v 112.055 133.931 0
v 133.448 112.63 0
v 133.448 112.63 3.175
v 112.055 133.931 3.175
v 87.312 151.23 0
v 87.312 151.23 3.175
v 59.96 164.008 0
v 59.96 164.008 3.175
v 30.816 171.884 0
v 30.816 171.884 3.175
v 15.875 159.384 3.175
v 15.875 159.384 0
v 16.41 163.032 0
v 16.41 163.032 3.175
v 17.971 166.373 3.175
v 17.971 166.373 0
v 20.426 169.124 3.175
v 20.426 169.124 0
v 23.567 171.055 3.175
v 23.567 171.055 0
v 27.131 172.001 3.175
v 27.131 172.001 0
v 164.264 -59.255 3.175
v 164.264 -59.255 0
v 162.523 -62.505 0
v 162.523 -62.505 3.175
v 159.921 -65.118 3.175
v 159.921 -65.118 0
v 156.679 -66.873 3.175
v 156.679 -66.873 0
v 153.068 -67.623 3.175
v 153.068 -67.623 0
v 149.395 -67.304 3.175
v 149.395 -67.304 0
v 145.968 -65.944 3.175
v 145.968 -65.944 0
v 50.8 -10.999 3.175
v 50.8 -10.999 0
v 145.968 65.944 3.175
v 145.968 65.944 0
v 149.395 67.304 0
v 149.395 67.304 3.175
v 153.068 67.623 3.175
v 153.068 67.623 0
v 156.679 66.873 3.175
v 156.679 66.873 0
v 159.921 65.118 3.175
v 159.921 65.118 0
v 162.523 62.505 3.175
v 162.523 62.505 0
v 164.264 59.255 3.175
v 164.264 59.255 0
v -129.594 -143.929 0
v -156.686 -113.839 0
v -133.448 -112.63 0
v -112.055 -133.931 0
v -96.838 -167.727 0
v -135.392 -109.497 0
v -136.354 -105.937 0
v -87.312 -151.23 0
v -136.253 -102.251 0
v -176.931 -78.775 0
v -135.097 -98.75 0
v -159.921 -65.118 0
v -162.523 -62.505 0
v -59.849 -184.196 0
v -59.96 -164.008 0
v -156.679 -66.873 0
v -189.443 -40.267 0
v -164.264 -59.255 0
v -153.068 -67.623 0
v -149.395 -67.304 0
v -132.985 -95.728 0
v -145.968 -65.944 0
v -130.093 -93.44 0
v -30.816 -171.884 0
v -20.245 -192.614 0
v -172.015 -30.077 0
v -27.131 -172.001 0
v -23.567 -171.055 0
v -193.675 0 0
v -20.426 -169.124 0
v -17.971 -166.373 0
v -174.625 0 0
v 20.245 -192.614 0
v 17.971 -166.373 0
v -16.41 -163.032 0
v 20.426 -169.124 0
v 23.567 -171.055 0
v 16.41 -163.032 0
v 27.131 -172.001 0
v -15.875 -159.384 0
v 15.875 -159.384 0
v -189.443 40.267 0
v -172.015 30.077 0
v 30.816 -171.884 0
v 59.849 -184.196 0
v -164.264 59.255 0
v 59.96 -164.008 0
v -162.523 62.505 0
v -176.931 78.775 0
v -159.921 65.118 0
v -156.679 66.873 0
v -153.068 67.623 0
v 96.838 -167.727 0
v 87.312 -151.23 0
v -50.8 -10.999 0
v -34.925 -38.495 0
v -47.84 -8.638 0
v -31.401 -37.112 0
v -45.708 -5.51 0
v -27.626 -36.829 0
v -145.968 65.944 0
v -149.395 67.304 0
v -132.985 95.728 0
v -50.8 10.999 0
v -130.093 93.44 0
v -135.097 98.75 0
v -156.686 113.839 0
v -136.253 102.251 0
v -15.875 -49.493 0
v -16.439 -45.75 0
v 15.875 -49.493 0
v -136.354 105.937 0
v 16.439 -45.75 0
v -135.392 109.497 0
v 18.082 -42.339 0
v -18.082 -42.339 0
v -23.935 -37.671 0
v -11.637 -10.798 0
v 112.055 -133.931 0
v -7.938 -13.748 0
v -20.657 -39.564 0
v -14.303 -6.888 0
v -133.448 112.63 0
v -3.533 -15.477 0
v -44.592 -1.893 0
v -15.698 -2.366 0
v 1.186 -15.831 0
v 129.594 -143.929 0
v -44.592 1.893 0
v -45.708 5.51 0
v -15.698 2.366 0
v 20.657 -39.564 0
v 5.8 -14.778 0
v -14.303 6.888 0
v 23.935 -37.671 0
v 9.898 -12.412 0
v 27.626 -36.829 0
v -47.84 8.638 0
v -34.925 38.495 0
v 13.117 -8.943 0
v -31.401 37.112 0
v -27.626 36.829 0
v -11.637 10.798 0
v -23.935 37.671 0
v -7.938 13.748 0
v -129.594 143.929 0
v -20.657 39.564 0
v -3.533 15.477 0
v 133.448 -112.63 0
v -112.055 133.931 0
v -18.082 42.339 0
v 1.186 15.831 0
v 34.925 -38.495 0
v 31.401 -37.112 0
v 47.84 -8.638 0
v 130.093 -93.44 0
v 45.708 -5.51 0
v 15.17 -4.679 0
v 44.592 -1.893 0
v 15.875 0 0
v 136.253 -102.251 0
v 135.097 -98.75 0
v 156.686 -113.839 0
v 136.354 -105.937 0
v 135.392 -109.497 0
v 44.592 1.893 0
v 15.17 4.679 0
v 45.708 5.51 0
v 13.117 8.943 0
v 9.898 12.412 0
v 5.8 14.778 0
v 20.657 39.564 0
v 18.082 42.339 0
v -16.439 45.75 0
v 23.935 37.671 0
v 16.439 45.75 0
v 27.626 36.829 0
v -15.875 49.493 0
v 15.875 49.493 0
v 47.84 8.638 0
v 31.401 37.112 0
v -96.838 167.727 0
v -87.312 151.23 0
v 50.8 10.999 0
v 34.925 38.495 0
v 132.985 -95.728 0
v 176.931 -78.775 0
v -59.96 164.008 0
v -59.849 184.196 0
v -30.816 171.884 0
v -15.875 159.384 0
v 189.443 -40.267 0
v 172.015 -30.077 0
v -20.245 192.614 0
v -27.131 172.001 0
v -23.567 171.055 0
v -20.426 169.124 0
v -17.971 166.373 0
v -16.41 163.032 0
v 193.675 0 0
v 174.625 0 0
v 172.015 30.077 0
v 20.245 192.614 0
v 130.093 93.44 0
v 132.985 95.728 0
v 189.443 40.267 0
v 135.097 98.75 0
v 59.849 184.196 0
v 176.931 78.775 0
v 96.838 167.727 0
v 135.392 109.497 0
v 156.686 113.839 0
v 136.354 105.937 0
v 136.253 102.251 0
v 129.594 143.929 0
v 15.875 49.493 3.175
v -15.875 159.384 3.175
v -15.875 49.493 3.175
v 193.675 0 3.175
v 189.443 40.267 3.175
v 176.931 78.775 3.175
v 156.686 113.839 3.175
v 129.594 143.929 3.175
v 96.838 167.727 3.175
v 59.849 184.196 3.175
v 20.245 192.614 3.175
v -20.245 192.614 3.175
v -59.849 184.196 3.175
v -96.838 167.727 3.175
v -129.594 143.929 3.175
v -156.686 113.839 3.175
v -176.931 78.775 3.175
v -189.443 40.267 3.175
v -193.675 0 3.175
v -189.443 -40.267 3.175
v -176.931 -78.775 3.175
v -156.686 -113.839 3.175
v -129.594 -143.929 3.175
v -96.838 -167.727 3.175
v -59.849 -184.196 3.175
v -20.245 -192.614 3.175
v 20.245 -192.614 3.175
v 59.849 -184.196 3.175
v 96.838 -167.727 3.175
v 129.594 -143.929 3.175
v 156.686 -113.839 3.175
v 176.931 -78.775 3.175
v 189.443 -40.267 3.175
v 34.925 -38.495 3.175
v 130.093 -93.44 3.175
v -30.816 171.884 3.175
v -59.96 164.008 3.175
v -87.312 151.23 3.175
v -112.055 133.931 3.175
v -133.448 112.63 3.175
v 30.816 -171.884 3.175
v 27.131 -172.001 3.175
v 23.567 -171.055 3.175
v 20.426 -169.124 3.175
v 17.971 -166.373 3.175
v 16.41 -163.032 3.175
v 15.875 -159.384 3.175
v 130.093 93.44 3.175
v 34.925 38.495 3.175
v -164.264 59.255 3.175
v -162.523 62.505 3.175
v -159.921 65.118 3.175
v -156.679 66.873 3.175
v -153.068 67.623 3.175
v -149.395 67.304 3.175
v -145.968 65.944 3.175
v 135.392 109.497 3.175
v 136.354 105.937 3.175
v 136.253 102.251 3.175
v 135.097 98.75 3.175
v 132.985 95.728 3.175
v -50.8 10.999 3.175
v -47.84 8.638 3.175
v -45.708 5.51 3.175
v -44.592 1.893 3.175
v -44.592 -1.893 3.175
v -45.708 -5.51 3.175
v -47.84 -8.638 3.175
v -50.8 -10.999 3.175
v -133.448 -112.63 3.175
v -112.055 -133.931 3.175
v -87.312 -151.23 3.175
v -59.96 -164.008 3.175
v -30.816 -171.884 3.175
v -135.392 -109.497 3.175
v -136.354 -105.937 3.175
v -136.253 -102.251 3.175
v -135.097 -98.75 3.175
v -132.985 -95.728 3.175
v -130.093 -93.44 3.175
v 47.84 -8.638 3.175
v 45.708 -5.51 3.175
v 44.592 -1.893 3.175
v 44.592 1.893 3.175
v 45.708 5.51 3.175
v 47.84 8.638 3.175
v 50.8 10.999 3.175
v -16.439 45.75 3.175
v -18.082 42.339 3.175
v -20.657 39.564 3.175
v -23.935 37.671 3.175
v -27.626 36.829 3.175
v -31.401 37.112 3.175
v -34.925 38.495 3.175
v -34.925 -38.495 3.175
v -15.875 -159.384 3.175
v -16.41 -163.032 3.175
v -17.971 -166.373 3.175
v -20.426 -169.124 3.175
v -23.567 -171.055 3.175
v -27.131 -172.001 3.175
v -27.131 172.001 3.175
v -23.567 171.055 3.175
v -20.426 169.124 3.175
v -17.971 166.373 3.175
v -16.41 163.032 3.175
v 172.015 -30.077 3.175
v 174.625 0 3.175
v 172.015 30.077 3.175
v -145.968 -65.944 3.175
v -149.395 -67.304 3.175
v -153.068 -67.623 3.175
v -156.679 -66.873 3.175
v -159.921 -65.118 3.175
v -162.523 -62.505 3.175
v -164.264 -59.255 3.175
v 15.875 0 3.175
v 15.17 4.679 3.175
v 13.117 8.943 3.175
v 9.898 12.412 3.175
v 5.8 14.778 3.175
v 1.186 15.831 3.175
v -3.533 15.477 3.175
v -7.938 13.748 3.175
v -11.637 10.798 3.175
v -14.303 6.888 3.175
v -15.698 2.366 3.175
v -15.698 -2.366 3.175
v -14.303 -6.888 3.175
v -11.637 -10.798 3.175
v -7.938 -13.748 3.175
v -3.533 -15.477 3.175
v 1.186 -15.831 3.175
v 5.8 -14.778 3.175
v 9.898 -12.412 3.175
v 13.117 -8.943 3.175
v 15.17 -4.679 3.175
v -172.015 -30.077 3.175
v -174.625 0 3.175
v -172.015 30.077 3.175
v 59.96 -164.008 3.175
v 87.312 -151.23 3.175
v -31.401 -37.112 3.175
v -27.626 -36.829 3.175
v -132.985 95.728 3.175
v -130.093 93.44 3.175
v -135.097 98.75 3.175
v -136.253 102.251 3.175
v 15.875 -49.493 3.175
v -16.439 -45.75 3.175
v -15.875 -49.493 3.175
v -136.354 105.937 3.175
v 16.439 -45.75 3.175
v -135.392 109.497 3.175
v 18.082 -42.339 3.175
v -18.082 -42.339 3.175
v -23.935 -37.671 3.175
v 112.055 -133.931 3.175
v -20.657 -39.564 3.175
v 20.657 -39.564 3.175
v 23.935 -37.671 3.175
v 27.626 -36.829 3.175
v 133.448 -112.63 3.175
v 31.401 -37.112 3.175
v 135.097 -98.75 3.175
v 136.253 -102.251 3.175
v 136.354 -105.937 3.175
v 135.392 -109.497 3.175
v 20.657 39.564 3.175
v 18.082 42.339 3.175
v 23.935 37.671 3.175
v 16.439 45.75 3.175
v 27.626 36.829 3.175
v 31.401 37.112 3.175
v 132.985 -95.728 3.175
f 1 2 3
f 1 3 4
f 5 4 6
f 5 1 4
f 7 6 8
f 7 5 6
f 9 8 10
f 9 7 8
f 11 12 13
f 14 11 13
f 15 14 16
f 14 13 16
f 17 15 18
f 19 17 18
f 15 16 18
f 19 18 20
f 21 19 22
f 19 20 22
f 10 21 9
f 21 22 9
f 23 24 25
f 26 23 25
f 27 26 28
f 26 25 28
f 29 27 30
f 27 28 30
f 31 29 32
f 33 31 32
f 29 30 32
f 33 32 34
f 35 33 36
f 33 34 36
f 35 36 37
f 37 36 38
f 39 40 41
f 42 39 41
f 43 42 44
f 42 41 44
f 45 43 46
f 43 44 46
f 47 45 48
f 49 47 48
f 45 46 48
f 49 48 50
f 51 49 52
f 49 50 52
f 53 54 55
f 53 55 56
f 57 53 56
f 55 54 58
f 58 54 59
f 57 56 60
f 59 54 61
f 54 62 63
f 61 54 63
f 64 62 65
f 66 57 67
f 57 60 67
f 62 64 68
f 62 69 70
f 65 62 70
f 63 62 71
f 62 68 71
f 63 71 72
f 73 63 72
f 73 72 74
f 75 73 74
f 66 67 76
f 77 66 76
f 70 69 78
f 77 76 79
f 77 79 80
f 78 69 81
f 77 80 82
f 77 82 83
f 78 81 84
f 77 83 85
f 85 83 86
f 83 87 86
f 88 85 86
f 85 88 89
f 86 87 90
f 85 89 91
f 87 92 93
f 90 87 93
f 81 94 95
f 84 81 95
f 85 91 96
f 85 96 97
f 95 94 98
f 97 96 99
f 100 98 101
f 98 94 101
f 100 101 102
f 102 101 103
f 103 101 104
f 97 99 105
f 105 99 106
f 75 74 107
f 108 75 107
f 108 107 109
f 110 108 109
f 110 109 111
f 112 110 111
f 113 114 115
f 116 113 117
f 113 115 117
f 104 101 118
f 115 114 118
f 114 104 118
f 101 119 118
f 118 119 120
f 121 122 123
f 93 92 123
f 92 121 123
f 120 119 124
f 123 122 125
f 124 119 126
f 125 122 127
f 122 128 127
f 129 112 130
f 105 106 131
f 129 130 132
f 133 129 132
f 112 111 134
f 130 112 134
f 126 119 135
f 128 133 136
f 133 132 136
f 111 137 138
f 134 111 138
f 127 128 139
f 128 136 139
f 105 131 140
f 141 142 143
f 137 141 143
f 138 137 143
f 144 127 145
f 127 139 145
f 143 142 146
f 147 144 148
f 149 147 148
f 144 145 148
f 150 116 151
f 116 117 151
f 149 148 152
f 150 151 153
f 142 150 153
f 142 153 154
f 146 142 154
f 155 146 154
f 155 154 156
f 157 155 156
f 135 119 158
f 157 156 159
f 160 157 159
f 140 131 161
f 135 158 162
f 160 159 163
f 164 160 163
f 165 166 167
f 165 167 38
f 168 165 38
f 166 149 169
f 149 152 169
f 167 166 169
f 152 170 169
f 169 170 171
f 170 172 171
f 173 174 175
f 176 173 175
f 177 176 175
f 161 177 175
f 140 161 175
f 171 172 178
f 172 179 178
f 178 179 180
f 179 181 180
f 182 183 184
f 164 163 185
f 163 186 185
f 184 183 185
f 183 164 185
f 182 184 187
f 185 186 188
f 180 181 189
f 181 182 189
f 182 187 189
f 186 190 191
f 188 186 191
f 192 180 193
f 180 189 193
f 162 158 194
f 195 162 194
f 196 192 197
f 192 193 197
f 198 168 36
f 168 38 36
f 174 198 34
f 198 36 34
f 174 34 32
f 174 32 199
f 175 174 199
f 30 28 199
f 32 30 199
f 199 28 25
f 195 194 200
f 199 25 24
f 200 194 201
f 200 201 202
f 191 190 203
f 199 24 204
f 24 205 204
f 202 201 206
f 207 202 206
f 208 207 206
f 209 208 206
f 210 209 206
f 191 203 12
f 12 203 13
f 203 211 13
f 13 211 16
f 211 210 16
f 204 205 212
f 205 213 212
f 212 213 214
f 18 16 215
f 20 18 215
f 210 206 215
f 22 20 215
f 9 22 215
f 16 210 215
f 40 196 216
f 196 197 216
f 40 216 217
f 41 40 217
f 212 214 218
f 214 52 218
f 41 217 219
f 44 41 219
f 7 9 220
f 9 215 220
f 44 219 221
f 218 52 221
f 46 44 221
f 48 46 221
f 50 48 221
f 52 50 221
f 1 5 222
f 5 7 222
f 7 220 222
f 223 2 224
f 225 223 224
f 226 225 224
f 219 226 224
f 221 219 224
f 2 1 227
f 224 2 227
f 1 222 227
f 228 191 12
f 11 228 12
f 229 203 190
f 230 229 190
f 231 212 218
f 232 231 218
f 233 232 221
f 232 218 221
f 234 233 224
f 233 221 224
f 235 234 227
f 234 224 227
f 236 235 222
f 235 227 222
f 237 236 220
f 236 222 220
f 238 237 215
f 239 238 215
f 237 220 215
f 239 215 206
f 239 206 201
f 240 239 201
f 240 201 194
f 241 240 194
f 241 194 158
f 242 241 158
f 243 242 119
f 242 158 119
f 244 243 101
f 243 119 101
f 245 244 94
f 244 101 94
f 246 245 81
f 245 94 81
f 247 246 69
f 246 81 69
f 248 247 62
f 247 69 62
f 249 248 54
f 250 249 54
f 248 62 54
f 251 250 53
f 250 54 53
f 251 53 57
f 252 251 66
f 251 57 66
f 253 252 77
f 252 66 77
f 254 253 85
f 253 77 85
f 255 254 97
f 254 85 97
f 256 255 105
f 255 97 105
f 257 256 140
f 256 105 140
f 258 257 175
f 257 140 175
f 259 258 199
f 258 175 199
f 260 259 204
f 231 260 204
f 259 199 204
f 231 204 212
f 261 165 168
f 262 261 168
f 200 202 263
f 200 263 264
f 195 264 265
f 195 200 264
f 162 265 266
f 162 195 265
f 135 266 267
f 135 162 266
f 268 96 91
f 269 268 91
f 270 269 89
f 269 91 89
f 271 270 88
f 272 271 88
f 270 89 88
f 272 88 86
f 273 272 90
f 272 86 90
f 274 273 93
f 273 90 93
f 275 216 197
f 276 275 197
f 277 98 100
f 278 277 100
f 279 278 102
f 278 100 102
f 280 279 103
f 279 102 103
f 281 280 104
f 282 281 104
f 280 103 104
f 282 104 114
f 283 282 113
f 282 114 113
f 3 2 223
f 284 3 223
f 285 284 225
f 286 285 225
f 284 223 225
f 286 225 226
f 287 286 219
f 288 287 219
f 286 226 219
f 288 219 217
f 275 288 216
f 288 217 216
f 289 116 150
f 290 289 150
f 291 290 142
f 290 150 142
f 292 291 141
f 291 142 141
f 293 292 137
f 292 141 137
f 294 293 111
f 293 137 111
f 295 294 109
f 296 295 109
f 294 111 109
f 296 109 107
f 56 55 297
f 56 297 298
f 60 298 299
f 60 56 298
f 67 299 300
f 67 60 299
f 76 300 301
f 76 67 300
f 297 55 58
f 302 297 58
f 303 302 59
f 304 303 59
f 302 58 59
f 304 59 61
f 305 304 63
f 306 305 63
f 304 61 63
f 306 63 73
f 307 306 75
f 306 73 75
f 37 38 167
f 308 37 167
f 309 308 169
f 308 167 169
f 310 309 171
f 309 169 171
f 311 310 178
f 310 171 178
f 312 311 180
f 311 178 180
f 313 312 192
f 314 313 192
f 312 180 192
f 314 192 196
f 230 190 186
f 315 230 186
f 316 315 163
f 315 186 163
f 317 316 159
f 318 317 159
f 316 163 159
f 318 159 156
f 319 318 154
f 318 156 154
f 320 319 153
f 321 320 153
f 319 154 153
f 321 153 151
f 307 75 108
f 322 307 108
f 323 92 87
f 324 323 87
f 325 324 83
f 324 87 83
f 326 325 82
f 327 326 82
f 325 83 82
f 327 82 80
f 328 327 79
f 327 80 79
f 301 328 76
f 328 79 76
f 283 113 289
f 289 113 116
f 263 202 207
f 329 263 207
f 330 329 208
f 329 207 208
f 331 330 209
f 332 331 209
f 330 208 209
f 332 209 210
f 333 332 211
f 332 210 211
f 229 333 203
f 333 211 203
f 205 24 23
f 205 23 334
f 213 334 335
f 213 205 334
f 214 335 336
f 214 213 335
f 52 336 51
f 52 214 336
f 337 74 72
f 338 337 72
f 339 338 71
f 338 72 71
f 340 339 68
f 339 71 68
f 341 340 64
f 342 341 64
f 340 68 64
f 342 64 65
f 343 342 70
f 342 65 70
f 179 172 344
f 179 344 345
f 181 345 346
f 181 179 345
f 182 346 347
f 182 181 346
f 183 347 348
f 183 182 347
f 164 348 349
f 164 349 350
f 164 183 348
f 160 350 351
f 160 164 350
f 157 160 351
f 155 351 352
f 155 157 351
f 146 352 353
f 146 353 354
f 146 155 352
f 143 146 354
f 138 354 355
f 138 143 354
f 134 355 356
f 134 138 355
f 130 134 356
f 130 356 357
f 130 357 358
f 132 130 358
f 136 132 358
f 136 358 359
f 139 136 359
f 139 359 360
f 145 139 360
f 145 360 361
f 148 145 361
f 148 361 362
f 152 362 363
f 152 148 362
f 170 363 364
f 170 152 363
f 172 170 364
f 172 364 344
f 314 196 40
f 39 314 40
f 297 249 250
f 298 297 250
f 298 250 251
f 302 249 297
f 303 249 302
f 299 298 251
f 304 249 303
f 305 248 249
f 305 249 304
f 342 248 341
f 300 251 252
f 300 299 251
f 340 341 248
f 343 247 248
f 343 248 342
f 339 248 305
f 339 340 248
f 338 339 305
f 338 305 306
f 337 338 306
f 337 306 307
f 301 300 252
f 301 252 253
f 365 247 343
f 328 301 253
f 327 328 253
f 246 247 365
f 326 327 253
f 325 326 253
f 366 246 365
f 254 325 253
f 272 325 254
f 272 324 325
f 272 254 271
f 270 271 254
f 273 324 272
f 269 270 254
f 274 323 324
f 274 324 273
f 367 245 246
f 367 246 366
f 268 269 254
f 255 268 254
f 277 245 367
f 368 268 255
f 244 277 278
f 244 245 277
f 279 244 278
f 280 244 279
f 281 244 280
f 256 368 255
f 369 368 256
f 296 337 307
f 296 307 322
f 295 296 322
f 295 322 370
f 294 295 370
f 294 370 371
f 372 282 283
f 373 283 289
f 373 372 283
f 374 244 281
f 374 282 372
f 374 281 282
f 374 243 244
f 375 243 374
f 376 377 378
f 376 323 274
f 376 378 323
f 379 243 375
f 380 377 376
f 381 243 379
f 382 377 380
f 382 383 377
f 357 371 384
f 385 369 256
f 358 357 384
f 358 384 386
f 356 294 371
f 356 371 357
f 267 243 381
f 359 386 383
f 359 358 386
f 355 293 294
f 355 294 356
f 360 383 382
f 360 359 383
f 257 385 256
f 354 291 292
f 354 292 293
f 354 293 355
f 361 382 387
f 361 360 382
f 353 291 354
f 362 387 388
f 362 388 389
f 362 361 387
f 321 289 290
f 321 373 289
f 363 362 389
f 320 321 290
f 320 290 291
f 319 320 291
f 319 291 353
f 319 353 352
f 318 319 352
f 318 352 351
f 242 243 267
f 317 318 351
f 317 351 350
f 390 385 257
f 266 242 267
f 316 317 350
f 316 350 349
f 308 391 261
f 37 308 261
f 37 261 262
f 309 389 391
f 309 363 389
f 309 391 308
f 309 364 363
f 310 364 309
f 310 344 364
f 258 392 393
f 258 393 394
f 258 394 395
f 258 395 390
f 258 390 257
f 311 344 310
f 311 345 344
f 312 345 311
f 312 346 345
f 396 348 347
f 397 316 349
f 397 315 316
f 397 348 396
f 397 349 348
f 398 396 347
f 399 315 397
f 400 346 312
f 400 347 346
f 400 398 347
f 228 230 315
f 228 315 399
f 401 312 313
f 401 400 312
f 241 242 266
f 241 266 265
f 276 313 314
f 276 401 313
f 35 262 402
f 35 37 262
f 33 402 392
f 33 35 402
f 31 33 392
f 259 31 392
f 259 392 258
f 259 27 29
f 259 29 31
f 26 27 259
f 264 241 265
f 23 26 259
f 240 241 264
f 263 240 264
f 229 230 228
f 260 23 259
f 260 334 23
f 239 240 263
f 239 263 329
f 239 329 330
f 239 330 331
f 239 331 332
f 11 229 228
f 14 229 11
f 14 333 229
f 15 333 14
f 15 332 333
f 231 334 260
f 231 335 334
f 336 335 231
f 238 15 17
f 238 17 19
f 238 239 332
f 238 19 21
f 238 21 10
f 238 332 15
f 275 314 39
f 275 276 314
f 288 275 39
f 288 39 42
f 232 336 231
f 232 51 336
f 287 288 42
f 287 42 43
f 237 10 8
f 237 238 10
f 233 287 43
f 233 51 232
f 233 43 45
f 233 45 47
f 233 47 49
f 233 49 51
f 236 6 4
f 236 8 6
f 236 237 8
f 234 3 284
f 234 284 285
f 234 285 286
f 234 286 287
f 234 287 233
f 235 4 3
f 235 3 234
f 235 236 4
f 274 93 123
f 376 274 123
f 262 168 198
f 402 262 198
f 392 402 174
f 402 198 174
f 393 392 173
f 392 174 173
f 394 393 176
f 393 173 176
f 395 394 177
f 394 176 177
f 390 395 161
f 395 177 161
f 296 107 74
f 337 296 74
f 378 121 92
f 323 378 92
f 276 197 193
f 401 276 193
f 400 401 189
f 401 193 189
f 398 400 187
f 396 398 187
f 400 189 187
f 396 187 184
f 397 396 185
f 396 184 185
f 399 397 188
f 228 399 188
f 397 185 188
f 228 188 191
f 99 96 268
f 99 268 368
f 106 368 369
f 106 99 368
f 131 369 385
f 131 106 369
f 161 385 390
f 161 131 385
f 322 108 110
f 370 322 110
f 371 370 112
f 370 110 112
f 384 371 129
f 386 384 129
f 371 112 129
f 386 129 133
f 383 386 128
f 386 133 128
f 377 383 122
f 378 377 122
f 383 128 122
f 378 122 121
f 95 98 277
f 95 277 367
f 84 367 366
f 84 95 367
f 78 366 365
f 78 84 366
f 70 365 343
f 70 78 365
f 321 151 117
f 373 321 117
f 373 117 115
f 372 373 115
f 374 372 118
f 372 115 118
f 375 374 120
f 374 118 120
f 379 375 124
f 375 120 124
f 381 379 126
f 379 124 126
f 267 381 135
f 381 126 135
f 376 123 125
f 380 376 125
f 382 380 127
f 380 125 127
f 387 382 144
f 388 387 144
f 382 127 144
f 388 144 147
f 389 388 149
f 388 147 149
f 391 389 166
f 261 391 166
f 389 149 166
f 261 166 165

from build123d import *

# Parameters (mm, degrees)
SKETCH1_R             = 193.675
SKETCH1_R_2           = 174.625
BOSS_EXTRUDE1_DEPTH   = 3.175
SKETCH1_R_3           = 34.925
SKETCH1_R_4           = 15.875
BOSS_EXTRUDE1_2_DEPTH = 3.175
BOSS_EXTRUDE2_START   = -3.175
SKETCH2_R             = 15.875
BOSS_EXTRUDE2_DEPTH   = 3.175


with BuildPart() as part:
    # Sketch1 → Boss-Extrude1 (new body)
    with BuildSketch(Plane.XY):
        Circle(SKETCH1_R)
        Circle(SKETCH1_R_2, mode=Mode.SUBTRACT)
    extrude(amount=BOSS_EXTRUDE1_DEPTH)



with BuildPart() as body_2:
    # Sketch1 → Boss-Extrude1 2 (new body)
    with BuildSketch(Plane.XY):
        Circle(SKETCH1_R_3)
        Circle(SKETCH1_R_4, mode=Mode.SUBTRACT)
    extrude(amount=BOSS_EXTRUDE1_2_DEPTH)


with BuildPart() as part_1:
    add(part.part)

    add(body_2.part)  # Boss-Extrude2 merges body 2
    # Sketch2 → Boss-Extrude2 (add)
    with BuildSketch(Plane.XY.offset(3.175).offset(BOSS_EXTRUDE2_START)):
        with BuildLine():
            Line((15.875, 49.493351826), (15.875, 159.383735055))
            ThreePointArc((15.875, 159.383735055), (20.425550361, 169.124190413), (30.816176471, 171.884420157))
            ThreePointArc((30.816176471, 171.884420157), (0, 174.625), (-30.816176471, 171.884420157))
            ThreePointArc((-30.816176471, 171.884420157), (-20.425550361, 169.124190413), (-15.875, 159.383735055))
            Line((-15.875, 159.383735055), (-15.875, 49.493351826))
            ThreePointArc((-15.875, 49.493351826), (-22.225, 38.494829198), (-34.925, 38.494829198))
            Line((-34.925, 38.494829198), (-130.092863507, 93.440020812))
            ThreePointArc((-130.092863507, 93.440020812), (-136.253070112, 102.251140706), (-133.448186135, 112.62980175))
            ThreePointArc((-133.448186135, 112.62980175), (-151.229686136, 87.3125), (-164.264362606, 59.254618408))
            ThreePointArc((-164.264362606, 59.254618408), (-156.678620473, 66.873049707), (-145.967863507, 65.943714242))
            Line((-145.967863507, 65.943714242), (-50.8, 10.998522628))
            ThreePointArc((-50.8, 10.998522628), (-44.45, 0), (-50.8, -10.998522628))
            Line((-50.8, -10.998522628), (-145.967863507, -65.943714242))
            ThreePointArc((-145.967863507, -65.943714242), (-156.678620473, -66.873049707), (-164.264362606, -59.254618408))
            ThreePointArc((-164.264362606, -59.254618408), (-151.229686136, -87.3125), (-133.448186135, -112.62980175))
            ThreePointArc((-133.448186135, -112.62980175), (-136.253070112, -102.251140706), (-130.092863507, -93.440020812))
            Line((-130.092863507, -93.440020812), (-34.925, -38.494829198))
            ThreePointArc((-34.925, -38.494829198), (-22.225, -38.494829198), (-15.875, -49.493351826))
            Line((-15.875, -49.493351826), (-15.875, -159.383735055))
            ThreePointArc((-15.875, -159.383735055), (-20.425550361, -169.124190413), (-30.816176471, -171.884420157))
            ThreePointArc((-30.816176471, -171.884420157), (0, -174.625), (30.816176471, -171.884420157))
            ThreePointArc((30.816176471, -171.884420157), (20.425550361, -169.124190413), (15.875, -159.383735055))
            Line((15.875, -159.383735055), (15.875, -49.493351826))
            ThreePointArc((15.875, -49.493351826), (22.225, -38.494829198), (34.925, -38.494829198))
            Line((34.925, -38.494829198), (130.092863507, -93.440020812))
            ThreePointArc((130.092863507, -93.440020812), (136.253070112, -102.251140706), (133.448186135, -112.62980175))
            ThreePointArc((133.448186135, -112.62980175), (151.229686136, -87.3125), (164.264362606, -59.254618408))
            ThreePointArc((164.264362606, -59.254618408), (156.678620473, -66.873049707), (145.967863507, -65.943714242))
            Line((145.967863507, -65.943714242), (50.8, -10.998522628))
            ThreePointArc((50.8, -10.998522628), (44.45, 0), (50.8, 10.998522628))
            Line((50.8, 10.998522628), (145.967863507, 65.943714242))
            ThreePointArc((145.967863507, 65.943714242), (156.678620473, 66.873049707), (164.264362606, 59.254618408))
            ThreePointArc((164.264362606, 59.254618408), (151.229686136, 87.3125), (133.448186135, 112.62980175))
            ThreePointArc((133.448186135, 112.62980175), (136.253070112, 102.251140706), (130.092863507, 93.440020812))
            Line((130.092863507, 93.440020812), (34.925, 38.494829198))
            ThreePointArc((34.925, 38.494829198), (22.225, 38.494829198), (15.875, 49.493351826))
        make_face()
        Circle(SKETCH2_R, mode=Mode.SUBTRACT)
    extrude(amount=BOSS_EXTRUDE2_DEPTH)


solid = part_1.part
